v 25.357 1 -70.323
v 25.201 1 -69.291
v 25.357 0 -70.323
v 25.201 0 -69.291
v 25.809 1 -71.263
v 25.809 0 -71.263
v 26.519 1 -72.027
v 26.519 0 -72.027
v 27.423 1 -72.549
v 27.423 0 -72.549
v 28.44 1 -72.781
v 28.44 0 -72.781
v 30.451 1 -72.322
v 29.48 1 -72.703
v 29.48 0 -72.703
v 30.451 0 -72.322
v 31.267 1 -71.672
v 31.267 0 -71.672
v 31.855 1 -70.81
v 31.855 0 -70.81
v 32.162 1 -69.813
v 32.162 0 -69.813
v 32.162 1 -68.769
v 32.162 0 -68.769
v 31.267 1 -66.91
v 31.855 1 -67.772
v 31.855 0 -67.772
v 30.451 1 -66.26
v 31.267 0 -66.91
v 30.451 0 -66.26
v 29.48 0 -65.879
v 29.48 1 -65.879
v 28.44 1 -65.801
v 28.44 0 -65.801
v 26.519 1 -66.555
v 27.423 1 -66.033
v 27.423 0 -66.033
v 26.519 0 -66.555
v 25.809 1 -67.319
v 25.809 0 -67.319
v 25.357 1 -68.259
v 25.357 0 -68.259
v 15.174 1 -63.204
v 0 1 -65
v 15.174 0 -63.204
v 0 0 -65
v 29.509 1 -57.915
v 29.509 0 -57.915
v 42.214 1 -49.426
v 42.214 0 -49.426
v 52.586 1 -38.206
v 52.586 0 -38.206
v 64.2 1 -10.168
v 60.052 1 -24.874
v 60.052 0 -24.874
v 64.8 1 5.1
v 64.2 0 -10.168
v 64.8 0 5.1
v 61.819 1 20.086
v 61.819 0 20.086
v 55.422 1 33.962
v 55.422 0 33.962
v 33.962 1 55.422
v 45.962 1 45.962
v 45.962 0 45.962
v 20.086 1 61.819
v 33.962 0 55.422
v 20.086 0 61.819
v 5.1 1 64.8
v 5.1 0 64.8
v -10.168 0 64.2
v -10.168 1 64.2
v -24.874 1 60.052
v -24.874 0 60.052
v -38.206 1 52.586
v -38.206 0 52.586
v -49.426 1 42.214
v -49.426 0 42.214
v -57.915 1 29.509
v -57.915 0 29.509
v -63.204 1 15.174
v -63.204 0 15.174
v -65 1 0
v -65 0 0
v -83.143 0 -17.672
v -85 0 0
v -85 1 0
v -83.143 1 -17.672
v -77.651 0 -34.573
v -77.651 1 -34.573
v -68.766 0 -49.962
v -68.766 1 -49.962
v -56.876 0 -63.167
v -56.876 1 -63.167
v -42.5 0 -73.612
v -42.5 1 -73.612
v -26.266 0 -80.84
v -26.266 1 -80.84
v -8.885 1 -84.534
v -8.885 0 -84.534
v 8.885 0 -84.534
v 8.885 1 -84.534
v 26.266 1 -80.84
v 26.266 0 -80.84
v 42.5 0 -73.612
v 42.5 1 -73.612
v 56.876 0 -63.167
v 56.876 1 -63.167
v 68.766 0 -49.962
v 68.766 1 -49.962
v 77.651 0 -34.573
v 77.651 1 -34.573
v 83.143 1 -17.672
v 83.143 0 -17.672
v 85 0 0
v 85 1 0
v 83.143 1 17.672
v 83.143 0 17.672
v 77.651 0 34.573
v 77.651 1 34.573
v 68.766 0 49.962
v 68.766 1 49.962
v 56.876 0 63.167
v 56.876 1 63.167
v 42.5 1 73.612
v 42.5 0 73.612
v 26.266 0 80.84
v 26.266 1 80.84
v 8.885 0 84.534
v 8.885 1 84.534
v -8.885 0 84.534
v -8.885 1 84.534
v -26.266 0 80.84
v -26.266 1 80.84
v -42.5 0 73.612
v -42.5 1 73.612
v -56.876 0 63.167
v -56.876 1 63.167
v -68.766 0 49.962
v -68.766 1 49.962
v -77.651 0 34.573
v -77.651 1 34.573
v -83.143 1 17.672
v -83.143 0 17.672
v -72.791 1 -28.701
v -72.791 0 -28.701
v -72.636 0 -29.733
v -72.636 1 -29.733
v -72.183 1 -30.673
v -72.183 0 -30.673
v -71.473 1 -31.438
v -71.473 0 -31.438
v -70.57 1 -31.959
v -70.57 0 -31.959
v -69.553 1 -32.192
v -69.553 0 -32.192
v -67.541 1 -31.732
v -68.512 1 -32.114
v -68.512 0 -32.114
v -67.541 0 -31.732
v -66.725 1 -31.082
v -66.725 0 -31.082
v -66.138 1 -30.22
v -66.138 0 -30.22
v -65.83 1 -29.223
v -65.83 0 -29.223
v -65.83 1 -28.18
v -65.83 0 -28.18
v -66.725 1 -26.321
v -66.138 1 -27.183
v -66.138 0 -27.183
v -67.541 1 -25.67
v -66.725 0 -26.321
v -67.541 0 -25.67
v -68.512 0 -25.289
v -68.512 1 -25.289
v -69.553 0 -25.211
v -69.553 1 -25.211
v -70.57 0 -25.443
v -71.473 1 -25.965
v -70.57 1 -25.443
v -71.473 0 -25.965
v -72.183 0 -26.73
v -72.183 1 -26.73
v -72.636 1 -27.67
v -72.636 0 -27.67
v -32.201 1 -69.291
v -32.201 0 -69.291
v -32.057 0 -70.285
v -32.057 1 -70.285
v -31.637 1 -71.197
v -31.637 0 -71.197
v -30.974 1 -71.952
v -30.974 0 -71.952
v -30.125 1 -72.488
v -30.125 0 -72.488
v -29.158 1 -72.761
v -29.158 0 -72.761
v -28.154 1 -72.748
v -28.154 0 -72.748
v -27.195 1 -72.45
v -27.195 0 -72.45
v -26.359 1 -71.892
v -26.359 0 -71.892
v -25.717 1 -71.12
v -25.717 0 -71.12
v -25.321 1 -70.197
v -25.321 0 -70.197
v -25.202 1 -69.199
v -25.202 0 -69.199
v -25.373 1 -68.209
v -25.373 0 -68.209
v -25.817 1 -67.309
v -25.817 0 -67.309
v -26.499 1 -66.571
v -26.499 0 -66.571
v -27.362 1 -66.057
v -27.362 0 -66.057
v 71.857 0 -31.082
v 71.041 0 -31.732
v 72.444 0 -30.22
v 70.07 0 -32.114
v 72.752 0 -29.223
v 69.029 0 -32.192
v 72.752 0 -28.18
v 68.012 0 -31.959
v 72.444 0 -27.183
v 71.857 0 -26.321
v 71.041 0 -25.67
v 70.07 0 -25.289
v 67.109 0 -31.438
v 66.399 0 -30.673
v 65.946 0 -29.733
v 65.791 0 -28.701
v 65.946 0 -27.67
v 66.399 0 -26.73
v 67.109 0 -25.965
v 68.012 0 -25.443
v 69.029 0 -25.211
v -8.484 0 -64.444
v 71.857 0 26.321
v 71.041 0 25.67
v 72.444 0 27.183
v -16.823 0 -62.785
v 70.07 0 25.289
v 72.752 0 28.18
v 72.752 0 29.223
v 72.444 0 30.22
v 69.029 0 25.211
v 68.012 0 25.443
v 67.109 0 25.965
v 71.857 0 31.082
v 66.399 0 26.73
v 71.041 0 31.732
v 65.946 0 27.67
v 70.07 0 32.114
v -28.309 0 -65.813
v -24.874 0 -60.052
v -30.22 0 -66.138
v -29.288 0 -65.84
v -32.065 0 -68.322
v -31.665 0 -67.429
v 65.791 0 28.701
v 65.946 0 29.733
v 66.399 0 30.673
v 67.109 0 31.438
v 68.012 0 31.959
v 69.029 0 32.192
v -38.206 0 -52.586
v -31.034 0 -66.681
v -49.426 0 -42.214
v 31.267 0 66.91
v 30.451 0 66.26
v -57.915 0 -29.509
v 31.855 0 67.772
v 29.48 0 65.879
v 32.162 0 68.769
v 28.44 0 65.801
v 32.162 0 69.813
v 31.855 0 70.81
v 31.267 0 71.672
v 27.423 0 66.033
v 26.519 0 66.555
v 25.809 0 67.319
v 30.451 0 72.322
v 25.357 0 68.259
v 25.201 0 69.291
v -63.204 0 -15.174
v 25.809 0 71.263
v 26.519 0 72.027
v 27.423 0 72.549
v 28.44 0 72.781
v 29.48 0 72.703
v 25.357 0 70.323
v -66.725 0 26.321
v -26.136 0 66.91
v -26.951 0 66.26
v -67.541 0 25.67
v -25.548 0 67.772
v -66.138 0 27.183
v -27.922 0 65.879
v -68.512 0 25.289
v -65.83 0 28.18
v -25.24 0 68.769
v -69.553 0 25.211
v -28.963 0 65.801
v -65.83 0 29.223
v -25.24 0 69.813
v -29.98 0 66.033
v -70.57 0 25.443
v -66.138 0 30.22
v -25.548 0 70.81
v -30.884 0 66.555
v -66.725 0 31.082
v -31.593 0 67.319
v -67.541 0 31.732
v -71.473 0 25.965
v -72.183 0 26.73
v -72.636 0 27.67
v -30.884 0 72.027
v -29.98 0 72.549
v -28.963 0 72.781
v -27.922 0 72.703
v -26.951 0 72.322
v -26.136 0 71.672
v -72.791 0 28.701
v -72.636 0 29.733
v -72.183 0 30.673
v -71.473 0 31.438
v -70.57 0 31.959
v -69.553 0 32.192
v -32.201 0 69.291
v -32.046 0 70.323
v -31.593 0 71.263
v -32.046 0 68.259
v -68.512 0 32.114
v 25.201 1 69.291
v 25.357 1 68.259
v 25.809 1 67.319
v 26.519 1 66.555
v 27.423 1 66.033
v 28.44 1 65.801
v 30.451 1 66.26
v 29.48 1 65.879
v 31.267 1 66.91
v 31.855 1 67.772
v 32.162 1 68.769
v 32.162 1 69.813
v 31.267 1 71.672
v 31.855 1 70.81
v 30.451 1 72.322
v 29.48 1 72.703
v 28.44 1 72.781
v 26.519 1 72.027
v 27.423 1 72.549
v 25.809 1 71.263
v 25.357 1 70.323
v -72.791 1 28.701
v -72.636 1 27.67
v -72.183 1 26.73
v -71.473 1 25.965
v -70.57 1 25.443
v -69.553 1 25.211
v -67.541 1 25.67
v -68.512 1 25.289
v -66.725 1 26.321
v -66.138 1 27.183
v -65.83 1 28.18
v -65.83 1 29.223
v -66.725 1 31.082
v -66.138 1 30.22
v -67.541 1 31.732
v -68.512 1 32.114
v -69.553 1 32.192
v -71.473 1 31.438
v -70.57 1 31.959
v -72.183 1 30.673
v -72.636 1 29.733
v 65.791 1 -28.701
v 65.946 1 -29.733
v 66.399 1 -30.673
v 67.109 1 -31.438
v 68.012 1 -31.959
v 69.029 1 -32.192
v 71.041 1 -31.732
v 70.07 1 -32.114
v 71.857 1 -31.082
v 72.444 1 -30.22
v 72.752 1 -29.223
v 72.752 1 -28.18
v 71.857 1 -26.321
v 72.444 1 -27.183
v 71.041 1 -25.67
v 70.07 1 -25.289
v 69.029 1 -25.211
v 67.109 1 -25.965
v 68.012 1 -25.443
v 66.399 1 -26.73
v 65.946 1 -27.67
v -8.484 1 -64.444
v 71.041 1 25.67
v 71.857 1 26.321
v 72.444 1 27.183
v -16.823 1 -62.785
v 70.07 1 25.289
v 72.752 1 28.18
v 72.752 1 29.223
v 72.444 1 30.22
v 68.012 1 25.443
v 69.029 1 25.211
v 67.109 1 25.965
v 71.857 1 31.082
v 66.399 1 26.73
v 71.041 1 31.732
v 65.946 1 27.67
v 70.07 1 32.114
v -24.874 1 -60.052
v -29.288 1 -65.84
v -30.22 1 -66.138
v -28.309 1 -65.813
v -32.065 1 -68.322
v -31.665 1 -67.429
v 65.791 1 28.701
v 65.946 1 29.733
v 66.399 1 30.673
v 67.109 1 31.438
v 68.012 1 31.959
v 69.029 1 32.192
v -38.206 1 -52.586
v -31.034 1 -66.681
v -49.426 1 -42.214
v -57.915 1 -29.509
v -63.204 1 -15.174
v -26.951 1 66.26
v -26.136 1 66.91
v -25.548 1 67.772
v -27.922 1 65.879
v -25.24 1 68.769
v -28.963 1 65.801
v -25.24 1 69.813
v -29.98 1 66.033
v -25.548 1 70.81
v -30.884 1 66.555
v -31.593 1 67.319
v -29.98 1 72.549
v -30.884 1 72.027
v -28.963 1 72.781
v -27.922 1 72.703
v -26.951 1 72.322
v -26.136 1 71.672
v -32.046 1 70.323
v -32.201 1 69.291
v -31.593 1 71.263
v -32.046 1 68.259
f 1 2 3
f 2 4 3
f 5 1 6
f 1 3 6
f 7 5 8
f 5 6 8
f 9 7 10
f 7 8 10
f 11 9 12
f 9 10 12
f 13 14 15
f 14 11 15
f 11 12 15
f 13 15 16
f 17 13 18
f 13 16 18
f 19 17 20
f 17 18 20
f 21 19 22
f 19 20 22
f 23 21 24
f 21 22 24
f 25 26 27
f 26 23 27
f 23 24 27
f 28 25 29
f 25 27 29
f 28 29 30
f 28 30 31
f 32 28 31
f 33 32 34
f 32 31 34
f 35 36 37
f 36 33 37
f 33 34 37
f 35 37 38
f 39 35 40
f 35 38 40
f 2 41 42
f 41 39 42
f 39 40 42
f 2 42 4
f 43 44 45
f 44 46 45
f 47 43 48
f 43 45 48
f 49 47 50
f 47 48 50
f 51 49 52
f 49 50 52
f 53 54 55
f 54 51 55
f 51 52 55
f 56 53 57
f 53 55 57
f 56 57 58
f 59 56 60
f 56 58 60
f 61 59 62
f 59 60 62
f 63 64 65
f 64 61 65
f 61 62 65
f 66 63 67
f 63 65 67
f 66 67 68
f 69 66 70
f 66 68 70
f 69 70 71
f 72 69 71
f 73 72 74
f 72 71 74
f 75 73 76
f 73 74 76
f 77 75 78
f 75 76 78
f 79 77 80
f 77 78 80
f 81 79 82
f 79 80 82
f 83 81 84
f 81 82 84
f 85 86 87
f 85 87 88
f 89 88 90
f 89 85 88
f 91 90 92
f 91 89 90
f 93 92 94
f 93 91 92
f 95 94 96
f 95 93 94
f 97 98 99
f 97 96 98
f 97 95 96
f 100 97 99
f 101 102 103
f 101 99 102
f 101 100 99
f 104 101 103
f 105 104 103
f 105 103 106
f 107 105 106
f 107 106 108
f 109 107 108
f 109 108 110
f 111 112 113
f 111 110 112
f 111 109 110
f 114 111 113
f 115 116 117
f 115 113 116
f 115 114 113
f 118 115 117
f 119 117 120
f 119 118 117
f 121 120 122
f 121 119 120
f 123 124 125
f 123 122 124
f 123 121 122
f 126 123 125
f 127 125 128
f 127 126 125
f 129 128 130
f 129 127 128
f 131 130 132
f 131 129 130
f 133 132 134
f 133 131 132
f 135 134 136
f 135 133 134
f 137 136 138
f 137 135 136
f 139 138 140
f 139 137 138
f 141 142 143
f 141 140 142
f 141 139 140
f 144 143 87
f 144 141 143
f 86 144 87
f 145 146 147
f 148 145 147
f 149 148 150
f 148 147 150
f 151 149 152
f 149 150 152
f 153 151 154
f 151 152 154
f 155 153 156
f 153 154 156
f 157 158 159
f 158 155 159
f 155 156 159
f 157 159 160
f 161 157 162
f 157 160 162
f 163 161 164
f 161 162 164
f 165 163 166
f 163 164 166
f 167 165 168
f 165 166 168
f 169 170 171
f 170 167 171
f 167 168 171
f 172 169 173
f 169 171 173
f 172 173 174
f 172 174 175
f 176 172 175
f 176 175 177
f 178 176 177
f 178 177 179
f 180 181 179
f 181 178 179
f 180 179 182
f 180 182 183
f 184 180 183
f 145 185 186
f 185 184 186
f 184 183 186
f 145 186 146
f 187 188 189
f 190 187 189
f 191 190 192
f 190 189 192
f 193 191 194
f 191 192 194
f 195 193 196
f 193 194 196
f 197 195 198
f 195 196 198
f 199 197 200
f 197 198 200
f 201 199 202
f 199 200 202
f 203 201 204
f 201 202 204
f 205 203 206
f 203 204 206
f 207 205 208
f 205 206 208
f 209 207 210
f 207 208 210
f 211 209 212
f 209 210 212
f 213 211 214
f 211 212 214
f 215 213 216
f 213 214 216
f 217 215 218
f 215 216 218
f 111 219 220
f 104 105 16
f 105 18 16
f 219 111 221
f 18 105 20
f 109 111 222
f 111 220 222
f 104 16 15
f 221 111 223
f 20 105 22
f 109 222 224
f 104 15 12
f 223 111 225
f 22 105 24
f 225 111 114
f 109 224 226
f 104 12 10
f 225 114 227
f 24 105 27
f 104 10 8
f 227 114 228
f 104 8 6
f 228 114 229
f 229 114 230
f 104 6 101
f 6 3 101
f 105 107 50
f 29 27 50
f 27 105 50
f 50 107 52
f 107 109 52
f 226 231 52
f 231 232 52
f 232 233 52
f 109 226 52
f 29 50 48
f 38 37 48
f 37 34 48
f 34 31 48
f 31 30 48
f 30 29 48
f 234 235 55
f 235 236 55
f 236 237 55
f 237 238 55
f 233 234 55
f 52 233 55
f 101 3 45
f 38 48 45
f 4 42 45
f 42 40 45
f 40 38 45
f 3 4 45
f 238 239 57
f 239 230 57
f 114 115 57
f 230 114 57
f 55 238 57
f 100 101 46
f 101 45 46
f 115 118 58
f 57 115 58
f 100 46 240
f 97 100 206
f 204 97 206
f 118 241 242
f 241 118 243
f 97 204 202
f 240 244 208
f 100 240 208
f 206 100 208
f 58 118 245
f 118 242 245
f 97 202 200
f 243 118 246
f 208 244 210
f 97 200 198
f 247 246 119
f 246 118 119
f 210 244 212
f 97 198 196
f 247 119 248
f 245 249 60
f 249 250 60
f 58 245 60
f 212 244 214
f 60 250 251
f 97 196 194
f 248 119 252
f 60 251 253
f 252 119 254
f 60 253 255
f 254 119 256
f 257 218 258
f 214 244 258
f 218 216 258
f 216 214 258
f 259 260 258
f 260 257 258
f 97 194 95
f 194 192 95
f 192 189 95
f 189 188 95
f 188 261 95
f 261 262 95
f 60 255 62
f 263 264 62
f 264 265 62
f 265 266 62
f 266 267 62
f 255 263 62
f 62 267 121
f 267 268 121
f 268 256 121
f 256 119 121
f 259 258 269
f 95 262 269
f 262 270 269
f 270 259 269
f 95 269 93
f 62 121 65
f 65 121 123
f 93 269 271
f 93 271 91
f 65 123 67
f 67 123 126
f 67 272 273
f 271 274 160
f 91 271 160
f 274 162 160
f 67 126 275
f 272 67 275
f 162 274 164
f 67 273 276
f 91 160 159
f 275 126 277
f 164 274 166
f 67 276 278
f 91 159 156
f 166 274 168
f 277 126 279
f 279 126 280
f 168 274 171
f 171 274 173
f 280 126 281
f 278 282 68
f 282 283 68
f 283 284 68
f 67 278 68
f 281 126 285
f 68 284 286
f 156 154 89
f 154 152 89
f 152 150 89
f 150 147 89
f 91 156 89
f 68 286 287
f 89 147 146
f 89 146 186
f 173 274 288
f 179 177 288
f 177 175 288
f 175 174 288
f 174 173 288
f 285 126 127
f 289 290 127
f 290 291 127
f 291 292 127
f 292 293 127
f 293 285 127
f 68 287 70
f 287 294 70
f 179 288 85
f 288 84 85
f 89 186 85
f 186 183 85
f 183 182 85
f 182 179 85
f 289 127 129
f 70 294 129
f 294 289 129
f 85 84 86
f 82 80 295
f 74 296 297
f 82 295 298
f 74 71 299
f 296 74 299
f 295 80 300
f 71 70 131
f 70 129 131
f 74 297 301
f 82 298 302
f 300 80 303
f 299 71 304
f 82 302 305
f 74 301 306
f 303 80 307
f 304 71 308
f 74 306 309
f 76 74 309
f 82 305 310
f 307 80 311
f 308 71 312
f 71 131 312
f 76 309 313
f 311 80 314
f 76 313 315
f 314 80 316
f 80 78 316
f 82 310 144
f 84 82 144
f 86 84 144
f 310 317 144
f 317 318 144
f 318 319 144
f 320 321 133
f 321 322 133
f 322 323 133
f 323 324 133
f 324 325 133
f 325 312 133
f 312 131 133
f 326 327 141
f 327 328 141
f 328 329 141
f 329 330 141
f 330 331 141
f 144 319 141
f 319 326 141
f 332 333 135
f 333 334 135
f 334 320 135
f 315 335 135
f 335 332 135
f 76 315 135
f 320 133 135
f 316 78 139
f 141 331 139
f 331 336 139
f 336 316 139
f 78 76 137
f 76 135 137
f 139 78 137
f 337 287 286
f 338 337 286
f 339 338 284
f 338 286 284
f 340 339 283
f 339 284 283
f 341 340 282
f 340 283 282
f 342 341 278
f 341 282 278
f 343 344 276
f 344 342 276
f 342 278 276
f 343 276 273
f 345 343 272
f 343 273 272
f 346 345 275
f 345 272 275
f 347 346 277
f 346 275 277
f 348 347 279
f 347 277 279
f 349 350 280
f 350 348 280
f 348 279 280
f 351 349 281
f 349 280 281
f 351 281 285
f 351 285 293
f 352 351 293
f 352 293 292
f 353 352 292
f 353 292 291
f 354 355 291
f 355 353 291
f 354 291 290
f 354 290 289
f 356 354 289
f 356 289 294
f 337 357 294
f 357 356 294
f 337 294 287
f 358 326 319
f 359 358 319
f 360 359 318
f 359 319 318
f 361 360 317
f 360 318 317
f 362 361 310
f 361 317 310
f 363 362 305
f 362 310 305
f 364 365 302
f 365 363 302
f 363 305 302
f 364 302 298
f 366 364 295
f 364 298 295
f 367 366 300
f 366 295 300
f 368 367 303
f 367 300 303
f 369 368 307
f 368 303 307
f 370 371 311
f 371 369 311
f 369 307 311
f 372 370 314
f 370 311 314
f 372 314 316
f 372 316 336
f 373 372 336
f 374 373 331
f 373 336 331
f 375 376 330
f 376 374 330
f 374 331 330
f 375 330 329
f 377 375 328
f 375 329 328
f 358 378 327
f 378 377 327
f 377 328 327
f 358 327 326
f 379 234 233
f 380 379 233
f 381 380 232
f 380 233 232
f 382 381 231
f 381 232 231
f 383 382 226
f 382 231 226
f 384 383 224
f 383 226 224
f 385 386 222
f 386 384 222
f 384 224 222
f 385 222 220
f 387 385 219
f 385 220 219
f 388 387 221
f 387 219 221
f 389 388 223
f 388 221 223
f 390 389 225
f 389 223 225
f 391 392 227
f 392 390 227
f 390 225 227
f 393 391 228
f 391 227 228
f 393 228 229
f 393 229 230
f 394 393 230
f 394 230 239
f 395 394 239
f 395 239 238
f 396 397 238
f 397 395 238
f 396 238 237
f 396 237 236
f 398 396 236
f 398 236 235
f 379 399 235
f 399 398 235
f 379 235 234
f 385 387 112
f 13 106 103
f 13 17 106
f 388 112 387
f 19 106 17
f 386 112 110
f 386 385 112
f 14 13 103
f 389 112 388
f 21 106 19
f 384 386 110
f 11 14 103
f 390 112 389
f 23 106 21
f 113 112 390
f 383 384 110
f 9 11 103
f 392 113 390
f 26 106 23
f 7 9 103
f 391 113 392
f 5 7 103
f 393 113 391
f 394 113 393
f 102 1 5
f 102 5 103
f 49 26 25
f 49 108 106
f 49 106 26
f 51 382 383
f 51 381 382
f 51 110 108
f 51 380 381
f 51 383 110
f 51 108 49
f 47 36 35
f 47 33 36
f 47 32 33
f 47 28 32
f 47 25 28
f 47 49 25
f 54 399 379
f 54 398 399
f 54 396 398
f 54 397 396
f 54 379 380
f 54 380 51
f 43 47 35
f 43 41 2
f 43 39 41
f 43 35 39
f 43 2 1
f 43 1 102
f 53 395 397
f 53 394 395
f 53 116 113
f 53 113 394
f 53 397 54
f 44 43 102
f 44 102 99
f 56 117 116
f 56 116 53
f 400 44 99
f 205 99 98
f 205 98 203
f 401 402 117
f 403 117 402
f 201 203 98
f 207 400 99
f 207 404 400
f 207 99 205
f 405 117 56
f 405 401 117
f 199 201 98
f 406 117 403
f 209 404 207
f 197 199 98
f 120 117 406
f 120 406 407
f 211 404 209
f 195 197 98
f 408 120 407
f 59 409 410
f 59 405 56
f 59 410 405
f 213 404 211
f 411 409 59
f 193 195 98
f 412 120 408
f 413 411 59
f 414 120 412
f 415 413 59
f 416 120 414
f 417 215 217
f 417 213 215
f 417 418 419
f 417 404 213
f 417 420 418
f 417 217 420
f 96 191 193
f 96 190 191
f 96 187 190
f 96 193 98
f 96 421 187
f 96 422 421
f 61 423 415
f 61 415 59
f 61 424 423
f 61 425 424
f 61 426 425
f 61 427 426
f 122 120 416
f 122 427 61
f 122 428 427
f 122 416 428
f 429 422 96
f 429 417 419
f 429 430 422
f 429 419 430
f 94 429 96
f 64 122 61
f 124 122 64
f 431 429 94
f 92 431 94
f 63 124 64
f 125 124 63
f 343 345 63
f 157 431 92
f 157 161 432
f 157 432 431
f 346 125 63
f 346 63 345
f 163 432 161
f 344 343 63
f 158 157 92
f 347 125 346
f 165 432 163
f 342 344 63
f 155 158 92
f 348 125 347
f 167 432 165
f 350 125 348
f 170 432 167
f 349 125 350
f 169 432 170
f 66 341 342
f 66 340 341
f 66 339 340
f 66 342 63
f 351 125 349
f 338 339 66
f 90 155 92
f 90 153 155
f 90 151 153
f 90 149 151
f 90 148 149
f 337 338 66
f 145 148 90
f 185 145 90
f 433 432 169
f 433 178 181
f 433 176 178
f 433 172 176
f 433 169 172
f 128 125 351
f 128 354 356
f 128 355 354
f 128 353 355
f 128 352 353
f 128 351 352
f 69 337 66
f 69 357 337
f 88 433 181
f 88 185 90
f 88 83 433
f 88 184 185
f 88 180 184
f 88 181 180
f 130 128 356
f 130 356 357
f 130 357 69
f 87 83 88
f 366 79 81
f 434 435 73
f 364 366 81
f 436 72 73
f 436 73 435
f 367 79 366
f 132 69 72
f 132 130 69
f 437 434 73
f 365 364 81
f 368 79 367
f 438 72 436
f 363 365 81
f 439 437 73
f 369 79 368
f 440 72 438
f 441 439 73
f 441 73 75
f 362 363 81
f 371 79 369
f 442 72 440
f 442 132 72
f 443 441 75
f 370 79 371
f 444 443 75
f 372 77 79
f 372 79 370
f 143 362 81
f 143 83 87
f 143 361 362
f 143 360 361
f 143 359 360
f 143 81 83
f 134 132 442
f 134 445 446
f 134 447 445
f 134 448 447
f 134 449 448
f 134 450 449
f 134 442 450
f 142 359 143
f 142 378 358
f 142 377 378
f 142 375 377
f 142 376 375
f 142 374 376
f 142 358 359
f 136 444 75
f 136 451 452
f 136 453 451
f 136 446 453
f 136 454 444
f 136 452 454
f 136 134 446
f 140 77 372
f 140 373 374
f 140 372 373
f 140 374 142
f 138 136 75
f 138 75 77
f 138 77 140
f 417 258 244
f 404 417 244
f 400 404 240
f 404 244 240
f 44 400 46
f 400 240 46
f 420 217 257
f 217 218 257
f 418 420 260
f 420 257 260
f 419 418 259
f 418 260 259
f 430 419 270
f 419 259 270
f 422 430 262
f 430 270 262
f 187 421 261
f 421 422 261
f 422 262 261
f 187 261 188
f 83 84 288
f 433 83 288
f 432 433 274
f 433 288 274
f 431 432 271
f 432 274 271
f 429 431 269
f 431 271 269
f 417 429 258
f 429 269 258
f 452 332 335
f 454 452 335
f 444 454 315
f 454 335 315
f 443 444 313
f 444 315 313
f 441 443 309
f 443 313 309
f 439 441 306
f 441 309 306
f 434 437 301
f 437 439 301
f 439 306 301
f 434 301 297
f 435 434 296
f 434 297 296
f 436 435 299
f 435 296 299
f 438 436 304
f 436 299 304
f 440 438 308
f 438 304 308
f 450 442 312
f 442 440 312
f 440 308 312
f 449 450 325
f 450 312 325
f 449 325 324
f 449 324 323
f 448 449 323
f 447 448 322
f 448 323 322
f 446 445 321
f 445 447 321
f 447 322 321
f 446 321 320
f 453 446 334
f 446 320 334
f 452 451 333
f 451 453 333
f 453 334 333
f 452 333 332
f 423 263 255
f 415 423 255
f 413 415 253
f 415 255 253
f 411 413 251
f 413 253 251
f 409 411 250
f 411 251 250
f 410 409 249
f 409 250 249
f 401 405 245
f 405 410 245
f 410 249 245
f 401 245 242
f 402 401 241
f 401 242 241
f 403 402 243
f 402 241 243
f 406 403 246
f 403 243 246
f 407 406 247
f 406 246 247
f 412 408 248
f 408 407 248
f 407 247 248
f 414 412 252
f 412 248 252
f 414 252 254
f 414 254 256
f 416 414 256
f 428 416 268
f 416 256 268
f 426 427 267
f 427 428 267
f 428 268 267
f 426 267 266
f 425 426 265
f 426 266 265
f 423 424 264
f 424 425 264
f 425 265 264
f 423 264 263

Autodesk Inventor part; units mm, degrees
ref_plane "YZ Plane" through (0, 0, 0) normal (1, 0, 0) x (0, 1, 0)
ref_plane "XZ Plane" through (0, 0, 0) normal (0, 1, 0) x (-1, 0, 0)
ref_plane "XY Plane" through (0, 0, 0) normal (0, 0, 1) x (1, 0, 0)
sketch "Sketch1" plane through (0, 0, 0) normal (0, 1, 0) x (-1, 0, 0)
  circle A0 centre (0, 0) radius 65
  circle A1 centre (0, 0) radius 85
  line L0 (0, 0) -> (28.7013, -69.291)
  line L1 (0, 0) -> (0, -65)
  circle A2 centre (28.7013, -69.291) radius 3.5
  circle A3 centre (69.291, -28.7013) radius 3.5
  circle A4 centre (69.291, 28.7013) radius 3.5
  circle A5 centre (28.7013, 69.291) radius 3.5
  circle A6 centre (-28.7013, 69.291) radius 3.5
  circle A7 centre (-69.291, 28.7013) radius 3.5
  circle A8 centre (-69.291, -28.7013) radius 3.5
  circle A9 centre (-28.7013, -69.291) radius 3.5
  dimension "d0" = 130
  dimension "d1" = 170
  dimension "d2" = 22.5
  dimension "d3" = 75
  dimension "d4" = 7
  dimension "d7" = 360
extrude "Extrusion1" add sketch "Sketch1" along normal blind 1
equation "\"d3\" = 0.25 * d0 + 0.25 * d1"
properties part number "Velcro connection"
